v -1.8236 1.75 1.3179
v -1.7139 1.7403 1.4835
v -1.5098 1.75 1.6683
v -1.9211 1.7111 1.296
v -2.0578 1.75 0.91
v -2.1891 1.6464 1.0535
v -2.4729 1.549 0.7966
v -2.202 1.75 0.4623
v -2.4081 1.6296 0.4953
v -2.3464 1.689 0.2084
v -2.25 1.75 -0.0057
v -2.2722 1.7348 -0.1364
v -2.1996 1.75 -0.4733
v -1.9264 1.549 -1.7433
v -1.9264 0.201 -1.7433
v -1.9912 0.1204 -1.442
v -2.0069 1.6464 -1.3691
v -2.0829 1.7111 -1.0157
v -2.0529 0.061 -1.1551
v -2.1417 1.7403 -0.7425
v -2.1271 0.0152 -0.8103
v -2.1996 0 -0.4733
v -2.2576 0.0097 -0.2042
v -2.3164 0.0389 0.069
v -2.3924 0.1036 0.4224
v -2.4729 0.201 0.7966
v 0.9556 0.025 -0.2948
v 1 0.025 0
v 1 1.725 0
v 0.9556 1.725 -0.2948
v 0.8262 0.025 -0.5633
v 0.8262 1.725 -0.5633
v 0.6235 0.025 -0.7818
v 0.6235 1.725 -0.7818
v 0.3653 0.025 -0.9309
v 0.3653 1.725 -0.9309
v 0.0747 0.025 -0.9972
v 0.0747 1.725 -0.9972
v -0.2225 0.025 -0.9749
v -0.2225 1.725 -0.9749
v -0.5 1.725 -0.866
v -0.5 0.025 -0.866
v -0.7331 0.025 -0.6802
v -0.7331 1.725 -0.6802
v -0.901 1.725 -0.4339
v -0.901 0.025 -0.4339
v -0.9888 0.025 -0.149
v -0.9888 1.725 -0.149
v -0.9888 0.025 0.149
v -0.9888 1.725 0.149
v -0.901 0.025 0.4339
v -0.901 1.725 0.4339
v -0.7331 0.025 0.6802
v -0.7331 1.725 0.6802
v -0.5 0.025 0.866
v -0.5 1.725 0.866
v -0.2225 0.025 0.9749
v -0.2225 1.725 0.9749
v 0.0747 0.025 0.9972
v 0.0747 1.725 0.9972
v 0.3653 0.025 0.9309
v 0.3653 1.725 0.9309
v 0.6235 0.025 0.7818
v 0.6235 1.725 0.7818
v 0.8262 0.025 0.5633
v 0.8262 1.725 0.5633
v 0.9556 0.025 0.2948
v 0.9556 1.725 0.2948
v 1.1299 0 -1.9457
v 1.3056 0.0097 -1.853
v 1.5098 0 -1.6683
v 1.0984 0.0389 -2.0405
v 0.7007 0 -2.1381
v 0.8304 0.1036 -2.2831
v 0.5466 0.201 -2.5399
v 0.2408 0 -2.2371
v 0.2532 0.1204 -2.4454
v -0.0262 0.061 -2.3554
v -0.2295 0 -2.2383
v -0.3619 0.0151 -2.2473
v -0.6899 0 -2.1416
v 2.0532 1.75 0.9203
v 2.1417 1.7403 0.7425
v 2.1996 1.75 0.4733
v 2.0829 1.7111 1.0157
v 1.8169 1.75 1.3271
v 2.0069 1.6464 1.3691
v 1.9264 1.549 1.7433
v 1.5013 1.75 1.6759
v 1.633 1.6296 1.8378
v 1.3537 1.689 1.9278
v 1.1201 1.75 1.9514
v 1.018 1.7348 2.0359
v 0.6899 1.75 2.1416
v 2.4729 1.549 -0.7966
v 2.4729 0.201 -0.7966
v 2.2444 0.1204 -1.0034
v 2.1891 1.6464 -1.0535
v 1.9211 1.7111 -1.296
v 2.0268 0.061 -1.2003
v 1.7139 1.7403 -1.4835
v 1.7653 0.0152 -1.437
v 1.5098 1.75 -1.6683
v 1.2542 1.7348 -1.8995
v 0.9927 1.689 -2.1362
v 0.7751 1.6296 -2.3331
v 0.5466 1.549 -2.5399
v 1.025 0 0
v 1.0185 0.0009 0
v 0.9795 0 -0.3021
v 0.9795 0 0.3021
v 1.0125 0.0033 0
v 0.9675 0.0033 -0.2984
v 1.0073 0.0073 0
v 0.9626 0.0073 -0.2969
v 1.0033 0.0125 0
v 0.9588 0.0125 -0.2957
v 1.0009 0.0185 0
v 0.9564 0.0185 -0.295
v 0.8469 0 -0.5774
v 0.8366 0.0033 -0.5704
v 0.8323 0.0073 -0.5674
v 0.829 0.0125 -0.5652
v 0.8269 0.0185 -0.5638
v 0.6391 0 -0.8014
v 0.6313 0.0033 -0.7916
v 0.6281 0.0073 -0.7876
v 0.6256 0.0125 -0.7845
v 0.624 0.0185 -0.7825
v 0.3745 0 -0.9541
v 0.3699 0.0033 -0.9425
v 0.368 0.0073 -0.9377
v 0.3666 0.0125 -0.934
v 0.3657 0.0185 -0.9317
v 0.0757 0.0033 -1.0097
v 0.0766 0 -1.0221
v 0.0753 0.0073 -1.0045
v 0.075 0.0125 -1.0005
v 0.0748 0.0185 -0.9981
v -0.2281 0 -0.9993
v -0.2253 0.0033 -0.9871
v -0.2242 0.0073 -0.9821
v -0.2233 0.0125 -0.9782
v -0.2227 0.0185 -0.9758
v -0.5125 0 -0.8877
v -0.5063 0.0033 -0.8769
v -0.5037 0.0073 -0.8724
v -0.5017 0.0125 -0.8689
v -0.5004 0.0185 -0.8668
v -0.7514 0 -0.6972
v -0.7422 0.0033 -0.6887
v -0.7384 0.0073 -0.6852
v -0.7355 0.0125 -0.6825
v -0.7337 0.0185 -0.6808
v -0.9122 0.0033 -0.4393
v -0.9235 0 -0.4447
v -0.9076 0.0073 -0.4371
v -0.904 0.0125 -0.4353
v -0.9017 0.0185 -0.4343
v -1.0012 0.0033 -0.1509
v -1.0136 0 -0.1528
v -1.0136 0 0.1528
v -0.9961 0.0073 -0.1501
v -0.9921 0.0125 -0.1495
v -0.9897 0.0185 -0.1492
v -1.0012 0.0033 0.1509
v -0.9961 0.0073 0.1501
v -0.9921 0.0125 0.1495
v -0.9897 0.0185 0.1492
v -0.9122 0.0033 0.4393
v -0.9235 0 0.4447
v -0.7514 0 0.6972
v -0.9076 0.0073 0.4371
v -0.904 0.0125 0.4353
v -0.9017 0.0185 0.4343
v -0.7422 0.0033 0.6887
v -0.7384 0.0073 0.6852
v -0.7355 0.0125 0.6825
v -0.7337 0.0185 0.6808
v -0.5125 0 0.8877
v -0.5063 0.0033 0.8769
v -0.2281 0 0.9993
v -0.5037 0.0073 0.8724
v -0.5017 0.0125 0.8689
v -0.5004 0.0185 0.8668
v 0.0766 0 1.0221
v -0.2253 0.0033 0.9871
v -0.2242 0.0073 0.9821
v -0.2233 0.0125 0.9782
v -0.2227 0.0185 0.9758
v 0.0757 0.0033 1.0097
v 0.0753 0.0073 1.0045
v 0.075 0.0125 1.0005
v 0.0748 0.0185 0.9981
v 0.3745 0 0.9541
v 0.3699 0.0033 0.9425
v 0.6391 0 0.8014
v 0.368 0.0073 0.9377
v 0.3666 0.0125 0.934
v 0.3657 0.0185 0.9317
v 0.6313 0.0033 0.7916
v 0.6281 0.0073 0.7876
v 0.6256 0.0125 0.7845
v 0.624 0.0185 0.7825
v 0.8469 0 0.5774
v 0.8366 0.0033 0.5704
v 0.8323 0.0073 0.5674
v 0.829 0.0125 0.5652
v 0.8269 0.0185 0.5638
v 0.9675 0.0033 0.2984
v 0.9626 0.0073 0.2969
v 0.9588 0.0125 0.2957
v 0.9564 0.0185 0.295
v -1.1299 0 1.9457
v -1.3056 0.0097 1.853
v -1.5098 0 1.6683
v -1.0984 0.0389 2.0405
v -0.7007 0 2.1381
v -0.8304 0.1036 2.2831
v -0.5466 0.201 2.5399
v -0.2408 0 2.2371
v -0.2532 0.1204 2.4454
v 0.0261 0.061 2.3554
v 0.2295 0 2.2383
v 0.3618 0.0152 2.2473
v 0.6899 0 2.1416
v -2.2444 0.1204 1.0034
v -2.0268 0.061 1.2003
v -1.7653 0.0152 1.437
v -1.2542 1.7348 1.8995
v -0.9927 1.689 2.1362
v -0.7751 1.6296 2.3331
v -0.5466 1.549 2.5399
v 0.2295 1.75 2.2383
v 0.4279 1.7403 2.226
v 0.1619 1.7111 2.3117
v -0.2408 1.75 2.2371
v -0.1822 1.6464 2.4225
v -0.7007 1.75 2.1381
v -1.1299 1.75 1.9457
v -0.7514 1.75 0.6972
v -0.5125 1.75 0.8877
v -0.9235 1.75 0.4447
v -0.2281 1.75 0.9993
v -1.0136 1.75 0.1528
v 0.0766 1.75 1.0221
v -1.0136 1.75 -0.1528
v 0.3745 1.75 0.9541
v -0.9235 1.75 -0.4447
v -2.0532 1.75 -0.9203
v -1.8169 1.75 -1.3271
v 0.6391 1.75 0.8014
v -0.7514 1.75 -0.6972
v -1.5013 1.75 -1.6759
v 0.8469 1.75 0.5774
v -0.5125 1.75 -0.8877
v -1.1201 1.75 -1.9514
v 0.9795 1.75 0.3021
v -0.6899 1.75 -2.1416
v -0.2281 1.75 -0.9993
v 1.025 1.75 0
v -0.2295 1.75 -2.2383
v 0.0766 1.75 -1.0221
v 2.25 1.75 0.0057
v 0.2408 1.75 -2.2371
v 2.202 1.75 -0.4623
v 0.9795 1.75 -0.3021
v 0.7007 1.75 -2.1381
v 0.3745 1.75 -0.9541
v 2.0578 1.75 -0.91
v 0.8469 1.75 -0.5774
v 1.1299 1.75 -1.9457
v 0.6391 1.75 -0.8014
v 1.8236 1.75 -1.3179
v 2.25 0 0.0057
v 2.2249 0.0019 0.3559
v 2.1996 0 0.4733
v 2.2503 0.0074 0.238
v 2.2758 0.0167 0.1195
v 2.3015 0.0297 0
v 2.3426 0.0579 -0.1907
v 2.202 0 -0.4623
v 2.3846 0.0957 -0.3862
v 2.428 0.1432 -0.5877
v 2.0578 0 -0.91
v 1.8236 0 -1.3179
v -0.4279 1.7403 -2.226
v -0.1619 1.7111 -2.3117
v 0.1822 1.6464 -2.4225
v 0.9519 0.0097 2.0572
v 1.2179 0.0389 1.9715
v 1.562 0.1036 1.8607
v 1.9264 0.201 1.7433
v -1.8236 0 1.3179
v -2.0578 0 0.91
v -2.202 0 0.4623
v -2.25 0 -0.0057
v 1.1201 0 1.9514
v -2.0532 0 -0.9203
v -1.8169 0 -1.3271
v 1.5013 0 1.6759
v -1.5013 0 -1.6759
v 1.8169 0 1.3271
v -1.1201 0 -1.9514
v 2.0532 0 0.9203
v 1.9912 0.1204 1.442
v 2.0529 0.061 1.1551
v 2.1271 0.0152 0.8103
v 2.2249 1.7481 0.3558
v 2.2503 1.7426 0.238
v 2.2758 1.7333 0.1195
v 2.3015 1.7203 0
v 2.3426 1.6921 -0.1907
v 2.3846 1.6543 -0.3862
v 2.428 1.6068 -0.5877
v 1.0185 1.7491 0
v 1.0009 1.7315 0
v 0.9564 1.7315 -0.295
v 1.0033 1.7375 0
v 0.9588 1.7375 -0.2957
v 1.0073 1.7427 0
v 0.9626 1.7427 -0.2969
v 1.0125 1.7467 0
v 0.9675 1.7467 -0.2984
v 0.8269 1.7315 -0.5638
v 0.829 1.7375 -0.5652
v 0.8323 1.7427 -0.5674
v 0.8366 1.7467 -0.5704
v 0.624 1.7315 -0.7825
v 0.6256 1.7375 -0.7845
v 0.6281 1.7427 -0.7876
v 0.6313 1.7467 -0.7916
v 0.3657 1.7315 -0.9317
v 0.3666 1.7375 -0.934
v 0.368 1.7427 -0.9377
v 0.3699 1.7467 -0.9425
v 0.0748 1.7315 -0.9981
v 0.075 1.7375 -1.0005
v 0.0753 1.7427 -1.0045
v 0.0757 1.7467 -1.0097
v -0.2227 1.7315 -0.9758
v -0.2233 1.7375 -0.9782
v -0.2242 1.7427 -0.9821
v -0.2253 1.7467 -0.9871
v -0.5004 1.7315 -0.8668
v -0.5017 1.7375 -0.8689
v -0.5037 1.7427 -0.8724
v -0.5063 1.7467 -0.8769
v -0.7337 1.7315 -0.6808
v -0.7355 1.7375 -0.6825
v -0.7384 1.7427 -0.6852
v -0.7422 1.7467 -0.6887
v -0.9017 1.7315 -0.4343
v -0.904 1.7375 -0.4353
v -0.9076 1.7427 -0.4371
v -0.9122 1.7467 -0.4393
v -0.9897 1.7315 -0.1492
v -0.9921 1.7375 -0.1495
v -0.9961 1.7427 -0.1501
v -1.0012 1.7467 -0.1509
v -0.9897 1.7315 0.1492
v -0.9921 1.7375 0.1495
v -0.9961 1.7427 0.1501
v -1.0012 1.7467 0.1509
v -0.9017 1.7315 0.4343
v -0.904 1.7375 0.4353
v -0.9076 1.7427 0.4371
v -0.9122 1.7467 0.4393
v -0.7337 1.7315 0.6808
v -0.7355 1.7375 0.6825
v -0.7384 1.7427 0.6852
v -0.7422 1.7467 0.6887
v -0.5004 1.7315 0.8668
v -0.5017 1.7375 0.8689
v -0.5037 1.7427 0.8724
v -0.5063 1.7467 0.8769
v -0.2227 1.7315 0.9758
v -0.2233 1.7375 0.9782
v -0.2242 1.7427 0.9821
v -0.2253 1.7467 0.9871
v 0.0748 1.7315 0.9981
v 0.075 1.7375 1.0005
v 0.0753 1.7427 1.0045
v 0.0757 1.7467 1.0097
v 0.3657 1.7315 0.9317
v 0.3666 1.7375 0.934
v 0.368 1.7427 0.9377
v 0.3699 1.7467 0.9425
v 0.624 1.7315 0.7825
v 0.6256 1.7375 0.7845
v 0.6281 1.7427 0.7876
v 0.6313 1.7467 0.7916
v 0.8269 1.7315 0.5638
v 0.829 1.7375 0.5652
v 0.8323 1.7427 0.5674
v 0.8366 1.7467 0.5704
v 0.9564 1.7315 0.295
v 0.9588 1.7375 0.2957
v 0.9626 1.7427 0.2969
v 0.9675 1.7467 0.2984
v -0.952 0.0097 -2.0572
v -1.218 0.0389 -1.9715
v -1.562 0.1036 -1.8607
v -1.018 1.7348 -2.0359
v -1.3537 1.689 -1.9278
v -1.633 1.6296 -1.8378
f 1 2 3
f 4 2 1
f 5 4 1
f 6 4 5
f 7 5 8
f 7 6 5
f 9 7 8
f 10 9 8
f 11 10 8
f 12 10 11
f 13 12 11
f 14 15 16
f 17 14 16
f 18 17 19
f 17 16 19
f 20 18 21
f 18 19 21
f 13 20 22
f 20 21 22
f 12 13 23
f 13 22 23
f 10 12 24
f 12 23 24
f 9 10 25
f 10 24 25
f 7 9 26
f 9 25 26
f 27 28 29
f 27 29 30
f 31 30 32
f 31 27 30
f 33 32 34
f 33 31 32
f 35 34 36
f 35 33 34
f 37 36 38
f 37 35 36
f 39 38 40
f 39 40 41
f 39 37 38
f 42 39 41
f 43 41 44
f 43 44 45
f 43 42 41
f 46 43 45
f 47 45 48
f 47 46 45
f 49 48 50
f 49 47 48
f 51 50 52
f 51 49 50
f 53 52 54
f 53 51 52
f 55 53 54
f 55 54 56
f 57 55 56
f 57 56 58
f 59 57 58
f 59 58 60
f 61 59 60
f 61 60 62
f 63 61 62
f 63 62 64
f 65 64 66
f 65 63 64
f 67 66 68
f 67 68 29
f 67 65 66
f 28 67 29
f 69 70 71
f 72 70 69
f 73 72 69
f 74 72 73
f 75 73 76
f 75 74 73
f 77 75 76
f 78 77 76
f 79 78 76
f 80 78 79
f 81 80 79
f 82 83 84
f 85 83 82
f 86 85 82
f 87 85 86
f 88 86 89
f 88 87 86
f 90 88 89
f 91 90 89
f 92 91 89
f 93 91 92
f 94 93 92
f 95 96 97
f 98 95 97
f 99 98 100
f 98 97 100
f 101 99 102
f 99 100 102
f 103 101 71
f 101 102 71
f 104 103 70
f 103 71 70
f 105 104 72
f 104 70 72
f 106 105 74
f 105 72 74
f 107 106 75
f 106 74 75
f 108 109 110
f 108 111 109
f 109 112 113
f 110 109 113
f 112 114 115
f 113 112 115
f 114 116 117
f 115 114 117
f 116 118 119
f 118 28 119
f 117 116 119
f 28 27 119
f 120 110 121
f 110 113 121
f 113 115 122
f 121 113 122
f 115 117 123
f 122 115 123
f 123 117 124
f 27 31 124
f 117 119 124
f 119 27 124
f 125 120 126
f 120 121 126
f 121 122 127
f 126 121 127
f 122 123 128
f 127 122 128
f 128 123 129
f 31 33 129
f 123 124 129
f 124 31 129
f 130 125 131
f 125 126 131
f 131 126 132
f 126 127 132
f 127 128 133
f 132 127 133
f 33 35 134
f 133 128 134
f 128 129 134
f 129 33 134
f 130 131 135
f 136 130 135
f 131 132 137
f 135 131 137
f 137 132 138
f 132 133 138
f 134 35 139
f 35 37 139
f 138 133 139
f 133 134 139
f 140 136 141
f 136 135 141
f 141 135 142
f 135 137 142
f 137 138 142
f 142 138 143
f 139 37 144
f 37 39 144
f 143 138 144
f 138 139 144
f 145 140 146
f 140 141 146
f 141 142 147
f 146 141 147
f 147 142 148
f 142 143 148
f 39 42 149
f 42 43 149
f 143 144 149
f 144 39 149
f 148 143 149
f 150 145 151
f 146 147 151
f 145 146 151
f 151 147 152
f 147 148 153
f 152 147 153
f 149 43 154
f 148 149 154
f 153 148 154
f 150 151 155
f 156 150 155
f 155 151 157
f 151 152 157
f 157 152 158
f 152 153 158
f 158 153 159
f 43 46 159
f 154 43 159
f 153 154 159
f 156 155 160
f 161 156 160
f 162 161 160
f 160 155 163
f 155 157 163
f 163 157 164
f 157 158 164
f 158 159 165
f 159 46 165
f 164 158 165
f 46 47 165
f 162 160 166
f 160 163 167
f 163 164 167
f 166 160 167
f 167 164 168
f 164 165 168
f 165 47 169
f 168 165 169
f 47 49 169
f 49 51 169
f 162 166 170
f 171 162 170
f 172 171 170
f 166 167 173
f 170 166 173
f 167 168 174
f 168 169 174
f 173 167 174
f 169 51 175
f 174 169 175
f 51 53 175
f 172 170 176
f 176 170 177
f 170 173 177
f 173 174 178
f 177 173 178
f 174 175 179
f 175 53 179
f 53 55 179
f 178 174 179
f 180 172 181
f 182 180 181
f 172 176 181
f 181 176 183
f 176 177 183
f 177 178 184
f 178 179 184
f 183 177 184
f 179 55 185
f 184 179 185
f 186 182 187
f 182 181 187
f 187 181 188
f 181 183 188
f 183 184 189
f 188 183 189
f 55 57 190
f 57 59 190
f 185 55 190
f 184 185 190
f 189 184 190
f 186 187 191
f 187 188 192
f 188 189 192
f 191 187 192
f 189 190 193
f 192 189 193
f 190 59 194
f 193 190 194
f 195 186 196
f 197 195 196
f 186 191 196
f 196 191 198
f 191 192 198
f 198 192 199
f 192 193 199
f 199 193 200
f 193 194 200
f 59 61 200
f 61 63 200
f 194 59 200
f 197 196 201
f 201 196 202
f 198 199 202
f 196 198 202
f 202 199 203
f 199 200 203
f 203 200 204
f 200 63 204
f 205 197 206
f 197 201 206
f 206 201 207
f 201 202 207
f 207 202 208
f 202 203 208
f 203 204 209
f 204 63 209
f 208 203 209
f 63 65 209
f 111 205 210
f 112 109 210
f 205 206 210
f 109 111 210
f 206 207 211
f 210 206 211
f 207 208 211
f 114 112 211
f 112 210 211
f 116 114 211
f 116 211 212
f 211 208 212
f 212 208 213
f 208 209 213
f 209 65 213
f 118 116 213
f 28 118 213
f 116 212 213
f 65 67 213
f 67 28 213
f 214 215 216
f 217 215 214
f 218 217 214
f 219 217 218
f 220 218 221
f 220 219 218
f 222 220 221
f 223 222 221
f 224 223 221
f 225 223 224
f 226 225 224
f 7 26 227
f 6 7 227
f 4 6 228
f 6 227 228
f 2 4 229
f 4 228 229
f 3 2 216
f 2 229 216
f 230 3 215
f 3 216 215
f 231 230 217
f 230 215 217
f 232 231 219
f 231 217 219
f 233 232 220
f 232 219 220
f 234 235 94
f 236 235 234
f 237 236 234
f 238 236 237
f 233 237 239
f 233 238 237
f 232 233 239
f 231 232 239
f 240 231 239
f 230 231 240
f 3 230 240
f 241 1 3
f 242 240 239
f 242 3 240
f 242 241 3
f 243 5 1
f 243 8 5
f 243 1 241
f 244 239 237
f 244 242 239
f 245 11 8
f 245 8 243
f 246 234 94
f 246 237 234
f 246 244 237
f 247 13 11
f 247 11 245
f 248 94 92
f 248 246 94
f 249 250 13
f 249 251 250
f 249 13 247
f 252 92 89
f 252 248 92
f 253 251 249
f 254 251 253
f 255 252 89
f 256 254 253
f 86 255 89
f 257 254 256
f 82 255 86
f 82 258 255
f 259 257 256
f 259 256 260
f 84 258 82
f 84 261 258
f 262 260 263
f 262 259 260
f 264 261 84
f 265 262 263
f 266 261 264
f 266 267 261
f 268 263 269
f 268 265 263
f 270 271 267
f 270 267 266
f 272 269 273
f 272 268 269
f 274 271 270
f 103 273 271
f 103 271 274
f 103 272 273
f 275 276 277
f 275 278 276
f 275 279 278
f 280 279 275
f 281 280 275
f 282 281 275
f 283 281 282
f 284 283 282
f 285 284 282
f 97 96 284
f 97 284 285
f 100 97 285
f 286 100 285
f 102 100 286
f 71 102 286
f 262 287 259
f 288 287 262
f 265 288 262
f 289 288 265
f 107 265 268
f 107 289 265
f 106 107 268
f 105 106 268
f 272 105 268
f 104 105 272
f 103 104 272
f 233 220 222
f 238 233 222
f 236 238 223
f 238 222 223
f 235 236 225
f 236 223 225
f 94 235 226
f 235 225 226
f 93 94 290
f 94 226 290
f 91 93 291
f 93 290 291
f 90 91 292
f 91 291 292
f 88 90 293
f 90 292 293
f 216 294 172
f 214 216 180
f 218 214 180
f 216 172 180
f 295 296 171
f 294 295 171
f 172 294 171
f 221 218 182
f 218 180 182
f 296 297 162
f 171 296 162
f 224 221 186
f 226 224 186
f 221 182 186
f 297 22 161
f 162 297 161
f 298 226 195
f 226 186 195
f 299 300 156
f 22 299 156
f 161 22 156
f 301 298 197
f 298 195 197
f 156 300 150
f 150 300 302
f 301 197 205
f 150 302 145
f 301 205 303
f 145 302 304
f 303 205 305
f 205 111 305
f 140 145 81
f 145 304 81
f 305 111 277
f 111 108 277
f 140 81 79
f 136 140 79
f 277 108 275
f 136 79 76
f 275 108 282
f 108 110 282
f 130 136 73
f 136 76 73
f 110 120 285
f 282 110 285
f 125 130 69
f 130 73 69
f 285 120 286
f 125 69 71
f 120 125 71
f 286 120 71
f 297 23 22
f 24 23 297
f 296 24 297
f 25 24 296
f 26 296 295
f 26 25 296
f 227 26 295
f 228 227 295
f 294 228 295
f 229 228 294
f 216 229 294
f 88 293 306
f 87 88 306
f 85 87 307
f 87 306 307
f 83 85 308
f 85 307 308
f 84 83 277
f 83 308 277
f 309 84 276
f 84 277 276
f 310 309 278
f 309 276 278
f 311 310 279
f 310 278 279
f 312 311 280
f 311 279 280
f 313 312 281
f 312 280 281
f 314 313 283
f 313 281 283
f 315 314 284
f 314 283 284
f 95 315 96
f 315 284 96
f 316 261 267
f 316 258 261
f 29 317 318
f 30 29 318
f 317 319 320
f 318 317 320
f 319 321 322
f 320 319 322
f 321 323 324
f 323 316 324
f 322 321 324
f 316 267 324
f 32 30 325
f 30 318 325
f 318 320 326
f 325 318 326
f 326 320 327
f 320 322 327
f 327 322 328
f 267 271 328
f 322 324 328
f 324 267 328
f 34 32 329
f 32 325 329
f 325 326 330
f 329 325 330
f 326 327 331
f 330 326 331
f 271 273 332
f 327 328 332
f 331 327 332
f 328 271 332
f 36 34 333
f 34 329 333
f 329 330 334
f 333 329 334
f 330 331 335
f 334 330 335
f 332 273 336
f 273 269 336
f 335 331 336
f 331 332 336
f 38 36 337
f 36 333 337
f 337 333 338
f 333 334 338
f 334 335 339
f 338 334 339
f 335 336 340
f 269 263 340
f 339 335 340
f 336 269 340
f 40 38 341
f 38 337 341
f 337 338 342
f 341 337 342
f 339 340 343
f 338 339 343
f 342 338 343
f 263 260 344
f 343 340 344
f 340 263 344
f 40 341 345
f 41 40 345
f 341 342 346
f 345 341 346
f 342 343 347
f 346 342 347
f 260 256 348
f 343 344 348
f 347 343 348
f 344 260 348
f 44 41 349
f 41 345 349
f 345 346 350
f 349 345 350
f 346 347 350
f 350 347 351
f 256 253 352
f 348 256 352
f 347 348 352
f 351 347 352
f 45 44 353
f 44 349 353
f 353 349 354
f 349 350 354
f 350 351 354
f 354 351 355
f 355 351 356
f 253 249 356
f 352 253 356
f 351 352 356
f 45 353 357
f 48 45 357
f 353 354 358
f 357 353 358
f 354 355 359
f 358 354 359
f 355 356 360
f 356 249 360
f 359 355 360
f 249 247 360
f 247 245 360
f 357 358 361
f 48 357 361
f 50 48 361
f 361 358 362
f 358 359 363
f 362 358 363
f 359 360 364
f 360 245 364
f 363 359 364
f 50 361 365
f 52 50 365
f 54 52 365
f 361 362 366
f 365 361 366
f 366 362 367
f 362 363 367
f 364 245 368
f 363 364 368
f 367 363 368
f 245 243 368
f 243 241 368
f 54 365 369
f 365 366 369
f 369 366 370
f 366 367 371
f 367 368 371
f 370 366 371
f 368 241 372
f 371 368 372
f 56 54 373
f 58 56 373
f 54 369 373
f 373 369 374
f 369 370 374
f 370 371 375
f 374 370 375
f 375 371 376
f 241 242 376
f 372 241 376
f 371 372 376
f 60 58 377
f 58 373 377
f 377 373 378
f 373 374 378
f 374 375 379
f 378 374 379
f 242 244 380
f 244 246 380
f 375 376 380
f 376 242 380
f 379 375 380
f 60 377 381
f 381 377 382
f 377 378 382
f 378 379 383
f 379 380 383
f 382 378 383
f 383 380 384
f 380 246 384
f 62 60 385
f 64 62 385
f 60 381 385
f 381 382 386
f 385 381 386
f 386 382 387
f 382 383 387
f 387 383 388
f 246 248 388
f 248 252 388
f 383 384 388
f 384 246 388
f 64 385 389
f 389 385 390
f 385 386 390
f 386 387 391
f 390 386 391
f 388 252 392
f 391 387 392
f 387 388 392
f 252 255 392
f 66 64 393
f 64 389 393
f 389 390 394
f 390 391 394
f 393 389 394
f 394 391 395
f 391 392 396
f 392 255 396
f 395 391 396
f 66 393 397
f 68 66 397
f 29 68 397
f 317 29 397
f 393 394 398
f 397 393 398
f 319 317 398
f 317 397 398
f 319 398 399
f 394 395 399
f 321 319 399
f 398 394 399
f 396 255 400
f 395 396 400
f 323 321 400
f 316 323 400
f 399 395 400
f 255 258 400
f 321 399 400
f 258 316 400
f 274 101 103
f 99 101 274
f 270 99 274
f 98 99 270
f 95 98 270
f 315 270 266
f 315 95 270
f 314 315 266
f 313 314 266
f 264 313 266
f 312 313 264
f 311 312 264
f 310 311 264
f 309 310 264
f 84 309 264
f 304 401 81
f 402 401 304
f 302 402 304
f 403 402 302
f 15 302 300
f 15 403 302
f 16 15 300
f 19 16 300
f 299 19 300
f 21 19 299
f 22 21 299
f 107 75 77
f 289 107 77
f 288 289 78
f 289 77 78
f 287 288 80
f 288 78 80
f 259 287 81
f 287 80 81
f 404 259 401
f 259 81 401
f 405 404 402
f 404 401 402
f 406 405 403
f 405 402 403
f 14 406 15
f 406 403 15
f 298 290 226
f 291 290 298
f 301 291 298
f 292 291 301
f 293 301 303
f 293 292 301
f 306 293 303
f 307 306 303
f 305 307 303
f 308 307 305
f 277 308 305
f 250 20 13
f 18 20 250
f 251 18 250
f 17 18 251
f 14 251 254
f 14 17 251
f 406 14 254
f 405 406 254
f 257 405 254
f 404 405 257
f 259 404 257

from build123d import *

# Parameters (mm, degrees)
SKETCH1_R           = 1
BOSS_EXTRUDE1_DEPTH = 1.75
SKETCH2_OUTSIDE_W   = 14.468
SKETCH2_OUTSIDE_H   = 14.602
SKETCH2_OUTSIDE_R   = 2.25
CUT_EXTRUDE1_DEPTH  = 1.75
CUT_EXTRUDE1_TAPER  = 60
SKETCH3_OUTSIDE_W   = 14.468
SKETCH3_OUTSIDE_H   = 14.602
SKETCH3_OUTSIDE_R   = 2.25
CUT_EXTRUDE2_DEPTH  = 1.75
CUT_EXTRUDE2_TAPER  = 60
FILLET1_R           = 0.025


with BuildPart() as part:
    # Sketch1 → Boss-Extrude1 (new body)
    with BuildSketch(Plane(origin=(0, 0, 0), x_dir=(1, 0, 0), z_dir=(0, 1, 0))):
        Polygon((-2.472933755, -0.796617), (-0.546576318, -2.539931953), (1.926357436, -1.743314953), (2.472933755, 0.796617), (0.546576318, 2.539931953), (-1.926357436, 1.743314953), align=None)
        Circle(SKETCH1_R, mode=Mode.SUBTRACT)
    extrude(amount=BOSS_EXTRUDE1_DEPTH)

    # Sketch2 outside → Cut-Extrude1 (cut)
    with BuildSketch(Plane(origin=(0, 1.75, 0), x_dir=(1, 0, 0), z_dir=(0, 1, 0))):
        Rectangle(SKETCH2_OUTSIDE_W, SKETCH2_OUTSIDE_H)
        Circle(SKETCH2_OUTSIDE_R, mode=Mode.SUBTRACT)
    extrude(amount=-CUT_EXTRUDE1_DEPTH, taper=CUT_EXTRUDE1_TAPER, mode=Mode.SUBTRACT)

    # Sketch3 outside → Cut-Extrude2 (cut)
    with BuildSketch(Plane.XZ):
        Rectangle(SKETCH3_OUTSIDE_W, SKETCH3_OUTSIDE_H)
        Circle(SKETCH3_OUTSIDE_R, mode=Mode.SUBTRACT)
    extrude(amount=-CUT_EXTRUDE2_DEPTH, taper=CUT_EXTRUDE2_TAPER, mode=Mode.SUBTRACT)

    # Fillet1
    fillet1_edges = [part.edges().sort_by_distance(p)[0] for p in [
        (-1, 0, 0),
        (-1, 1.75, 0),
    ]]
    fillet(fillet1_edges, radius=FILLET1_R)


solid = part.part
